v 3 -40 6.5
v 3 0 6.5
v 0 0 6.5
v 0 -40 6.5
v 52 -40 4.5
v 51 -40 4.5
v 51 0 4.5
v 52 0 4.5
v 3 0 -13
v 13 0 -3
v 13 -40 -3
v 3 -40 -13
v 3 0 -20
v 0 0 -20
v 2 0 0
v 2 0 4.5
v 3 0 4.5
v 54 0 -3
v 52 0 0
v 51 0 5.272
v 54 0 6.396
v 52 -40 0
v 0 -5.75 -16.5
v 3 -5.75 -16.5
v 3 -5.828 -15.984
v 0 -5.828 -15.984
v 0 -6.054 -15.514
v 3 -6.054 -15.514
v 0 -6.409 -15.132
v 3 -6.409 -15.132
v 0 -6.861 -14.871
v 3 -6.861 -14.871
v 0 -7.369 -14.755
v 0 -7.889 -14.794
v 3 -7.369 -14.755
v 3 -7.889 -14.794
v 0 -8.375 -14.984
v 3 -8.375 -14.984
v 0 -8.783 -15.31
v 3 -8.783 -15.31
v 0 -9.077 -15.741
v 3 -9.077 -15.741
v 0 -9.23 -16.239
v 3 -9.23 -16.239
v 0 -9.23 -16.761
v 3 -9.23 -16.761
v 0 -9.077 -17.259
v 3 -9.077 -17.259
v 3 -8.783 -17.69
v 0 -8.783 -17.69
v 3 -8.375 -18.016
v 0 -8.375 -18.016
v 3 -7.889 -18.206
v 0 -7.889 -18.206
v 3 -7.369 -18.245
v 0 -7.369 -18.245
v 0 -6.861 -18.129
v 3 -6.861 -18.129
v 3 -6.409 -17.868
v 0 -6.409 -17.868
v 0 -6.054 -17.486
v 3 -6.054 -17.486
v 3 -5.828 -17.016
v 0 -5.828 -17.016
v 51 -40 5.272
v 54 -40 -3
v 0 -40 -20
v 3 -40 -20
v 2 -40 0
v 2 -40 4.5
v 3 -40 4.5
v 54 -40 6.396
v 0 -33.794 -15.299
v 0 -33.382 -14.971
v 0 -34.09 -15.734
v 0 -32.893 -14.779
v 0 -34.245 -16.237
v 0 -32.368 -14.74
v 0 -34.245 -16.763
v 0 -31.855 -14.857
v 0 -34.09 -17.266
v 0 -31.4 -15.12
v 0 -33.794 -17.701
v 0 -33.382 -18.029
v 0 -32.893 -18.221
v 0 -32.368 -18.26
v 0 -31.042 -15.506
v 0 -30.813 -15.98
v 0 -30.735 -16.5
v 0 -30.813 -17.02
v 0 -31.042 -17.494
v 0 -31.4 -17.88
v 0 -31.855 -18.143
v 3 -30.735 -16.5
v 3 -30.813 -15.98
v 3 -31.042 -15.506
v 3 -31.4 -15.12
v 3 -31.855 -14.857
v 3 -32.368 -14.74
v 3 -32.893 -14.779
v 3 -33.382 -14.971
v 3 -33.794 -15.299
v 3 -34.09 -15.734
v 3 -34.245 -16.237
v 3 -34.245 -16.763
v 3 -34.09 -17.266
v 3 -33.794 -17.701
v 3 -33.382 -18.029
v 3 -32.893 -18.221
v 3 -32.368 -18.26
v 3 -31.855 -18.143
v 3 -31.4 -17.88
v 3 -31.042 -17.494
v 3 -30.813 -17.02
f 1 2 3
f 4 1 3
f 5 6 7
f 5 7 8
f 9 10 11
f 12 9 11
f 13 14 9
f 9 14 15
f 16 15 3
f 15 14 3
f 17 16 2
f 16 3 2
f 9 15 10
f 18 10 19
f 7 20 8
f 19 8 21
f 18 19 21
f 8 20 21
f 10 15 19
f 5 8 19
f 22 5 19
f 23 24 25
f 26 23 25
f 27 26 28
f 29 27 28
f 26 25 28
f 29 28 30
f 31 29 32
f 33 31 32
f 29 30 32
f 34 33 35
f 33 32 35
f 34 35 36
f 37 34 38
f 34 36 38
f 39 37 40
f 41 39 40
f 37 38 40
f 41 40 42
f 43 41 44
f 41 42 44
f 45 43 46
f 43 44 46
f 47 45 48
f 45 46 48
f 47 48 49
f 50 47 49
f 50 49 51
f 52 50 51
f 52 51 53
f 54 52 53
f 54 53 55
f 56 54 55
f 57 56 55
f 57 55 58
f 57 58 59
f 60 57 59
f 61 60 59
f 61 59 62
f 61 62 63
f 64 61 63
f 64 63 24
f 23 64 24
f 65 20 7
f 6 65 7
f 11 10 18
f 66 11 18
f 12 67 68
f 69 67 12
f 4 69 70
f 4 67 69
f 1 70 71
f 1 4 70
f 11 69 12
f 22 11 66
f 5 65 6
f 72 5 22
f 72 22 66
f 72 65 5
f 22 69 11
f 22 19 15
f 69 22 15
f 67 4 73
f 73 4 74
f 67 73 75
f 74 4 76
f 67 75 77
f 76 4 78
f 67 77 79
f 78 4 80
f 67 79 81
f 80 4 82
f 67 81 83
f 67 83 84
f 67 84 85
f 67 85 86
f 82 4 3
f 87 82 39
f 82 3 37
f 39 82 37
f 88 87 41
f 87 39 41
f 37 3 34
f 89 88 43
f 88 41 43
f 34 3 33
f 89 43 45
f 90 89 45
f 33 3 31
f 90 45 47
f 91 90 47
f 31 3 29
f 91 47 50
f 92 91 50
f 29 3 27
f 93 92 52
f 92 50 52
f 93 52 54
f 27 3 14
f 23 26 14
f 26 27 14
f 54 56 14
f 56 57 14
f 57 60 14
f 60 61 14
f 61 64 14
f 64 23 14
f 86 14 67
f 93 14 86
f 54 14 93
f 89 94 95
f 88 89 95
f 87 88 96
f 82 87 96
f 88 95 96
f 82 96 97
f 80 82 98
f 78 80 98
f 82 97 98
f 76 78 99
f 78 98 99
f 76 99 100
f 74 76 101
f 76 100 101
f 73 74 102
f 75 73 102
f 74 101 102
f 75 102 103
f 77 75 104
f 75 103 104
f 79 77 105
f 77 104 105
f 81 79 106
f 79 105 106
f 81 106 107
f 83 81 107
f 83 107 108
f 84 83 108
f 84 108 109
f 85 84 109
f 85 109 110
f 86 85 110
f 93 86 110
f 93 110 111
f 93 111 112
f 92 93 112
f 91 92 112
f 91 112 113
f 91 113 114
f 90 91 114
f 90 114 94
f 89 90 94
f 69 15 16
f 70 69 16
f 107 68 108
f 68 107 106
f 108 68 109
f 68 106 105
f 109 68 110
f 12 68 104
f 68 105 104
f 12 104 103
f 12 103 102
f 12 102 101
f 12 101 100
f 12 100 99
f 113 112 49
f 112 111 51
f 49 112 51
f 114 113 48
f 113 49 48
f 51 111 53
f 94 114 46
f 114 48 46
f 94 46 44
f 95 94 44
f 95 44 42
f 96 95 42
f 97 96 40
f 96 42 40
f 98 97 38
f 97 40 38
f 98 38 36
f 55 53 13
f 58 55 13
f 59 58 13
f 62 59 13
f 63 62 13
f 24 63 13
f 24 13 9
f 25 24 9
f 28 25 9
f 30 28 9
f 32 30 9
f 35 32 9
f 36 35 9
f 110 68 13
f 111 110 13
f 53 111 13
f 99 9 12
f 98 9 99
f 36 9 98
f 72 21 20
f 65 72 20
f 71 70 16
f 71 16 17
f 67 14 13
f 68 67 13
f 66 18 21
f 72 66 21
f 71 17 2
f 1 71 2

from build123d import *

# Parameters (mm, degrees)
F1_DEPTH = 40
F2_SIZE  = 10
F3_R     = 1.765
F3_R_2   = 1.75
F4_DEPTH = 25


with BuildPart() as f1:
    # F0 (on Front) → F1 (new body)
    with BuildSketch(Plane.XZ):
        Polygon((0, 6.5), (0, 0), (0, -20), (3, -20), (3, -3), (54, -3), (54, 0), (54, 6.395918), (51, 5.27192), (51, 4.5), (52, 4.5), (52, 0), (2, 0), (2, 4.5), (3, 4.5), (3, 6.5), align=None)
    extrude(amount=F1_DEPTH)

    # F2
    f2_edges = [f1.edges().sort_by_distance(p)[0] for p in [
        (3, -20, -3),
    ]]
    chamfer(f2_edges, length=F2_SIZE)

    # F3 (on face) → F4 (cut)
    with BuildSketch(Plane.YZ.offset(3)):
        with Locations((-32.5, -16.5)):
            Circle(F3_R)
        with Locations((-7.5, -16.5)):
            Circle(F3_R_2)
    extrude(amount=-F4_DEPTH, mode=Mode.SUBTRACT)


solid = f1.part
